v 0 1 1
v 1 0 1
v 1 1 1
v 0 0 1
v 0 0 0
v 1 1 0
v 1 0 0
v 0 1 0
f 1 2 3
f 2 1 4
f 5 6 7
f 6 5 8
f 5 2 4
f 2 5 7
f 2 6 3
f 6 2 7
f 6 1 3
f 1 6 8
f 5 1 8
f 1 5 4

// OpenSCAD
// file: ../lib/TOGMod1Constructors.scad
// TOGMod1Constructors-v1.11
// 
// Functions to construct objects understood by TOGMod1
// 
// v1.1:
// - Add togmod1_make_rounded_rect
// v1.2:
// - togmod1_make_rounded_rect can make ovals
// v1.3:
// - togmod1_circle_points, to just get the points of a circle
// - if pos parameter to circle function has a third element,
//   returned vertexes will include it as the z component;
// v1.3.1
// - Some assertions
// v1.4:
// - Refactor togmod1_rounded_rect_points and togmod1_circle_points
//   to use togmod1__make_nd_vector_adder for adapting to whatever
//   `pos` parameter is.
// v1.5:
// - togmod_rounded_rect_points will not simplify completely rounded sides
//   (where length of side is exactly twice the rounding radius)
//   unless simplify_rounded_sides=true
//   - This makes it more useful for polyhedron generation,
//     where radius varies, but number of points must remain constant.
// v1.6:
// - togmod1_make_rect makes a simple rectangle
// - togmod1_make_rounded_rect will defer to togmod1_make_rect when r=0
// v1.7:
// - togmod1_make_circle will return empty shape (["union"]) when d=0
// v1.8:
// - Add togmod1_text
// v1.9:
// - togmod1_circle_points uses 3 as minimum circle point count instead of 6
// v1.10:
// - Fix togmod1_linear_extrude_y so that range corresponds to Y start/end and
//   polygon X,Y correspond to X,Z.  Previously it was rotated wrongly,
//   which would have gone unnoticed for symmetrical shapes centered at 0,0.
// v1.11:
// - Remove an 'echo'

use <./TOGArrayLib1.scad>

function togmod1__make_nd_vector_adder(origin=[0,0]) =
	let(origin_is_zero = tal1_reduce(true, origin, function(prev,item) prev && item == 0))
	origin_is_zero ? (function(vec) len(vec) >= len(origin) ? vec : tal1_replace_at(origin, 0, vec)) :
	function(vec) [
		for(i=[0:1:max(len(origin),len(vec))-1]) (len(vec) > i ? vec[i] : 0) + (len(origin) > i ? origin[i] : 0),
	];

assert([1,2,3] == togmod1__make_nd_vector_adder()([1,2,3]));
assert([1,2,3] == togmod1__make_nd_vector_adder([0,0,3])([1,2]));


function togmod1_make_cuboid(size) =
	assert(is_list(size))
	assert(len(size) >= 3)
	assert(is_num(size[0]))
	assert(is_num(size[1]))
	assert(is_num(size[2]))
	["polyhedron-vf", [
		[-size[0]/2, -size[1]/2, -size[2]/2],
		[+size[0]/2, -size[1]/2, -size[2]/2],
		[-size[0]/2, +size[1]/2, -size[2]/2],
		[+size[0]/2, +size[1]/2, -size[2]/2],
		[-size[0]/2, -size[1]/2, +size[2]/2],
		[+size[0]/2, -size[1]/2, +size[2]/2],
		[-size[0]/2, +size[1]/2, +size[2]/2],
		[+size[0]/2, +size[1]/2, +size[2]/2]
	], [
		[0,1,3,2],[0,4,5,1],[4,6,7,5],[3,7,6,2],[1,5,7,3],[6,4,0,2]
	]];

function togmod1_make_polygon(verts) =
	["polygon-vp", verts, [[for( i=[0:1:len(verts)-1] ) i%len(verts)]]];

function togmod1_rounded_rect_points(size, r, pos=[0,0], simplify_rounded_sides=false) =
	assert(is_list(size))
	assert(len(size) >= 2)
	let(radii = is_list(r) ? r : is_num(r) ? [r,r] : assert(false, "rounded_rect r(adius) should be list<num> or num"))
	let(rx = radii[0])
	let(ry = radii[1])
	assert(is_num(rx))
	assert(is_num(ry))
	assert(size[0] >= 2*rx, str("size[0] must be >= 2*r[0]; size[0] = ",size[0],", 2*r[0] = ",2*rx))
	assert(size[1] >= 2*ry, str("size[1] must be >= 2*r[1]; size[1] = ",size[1],", 2*r[1] = ",2*ry))
	let(quarterfn=max($fn/4, 1))
	let(qfnx = simplify_rounded_sides && size[0] == 2*rx ? quarterfn-1 : quarterfn)
	let(qfny = simplify_rounded_sides && size[1] == 2*ry ? quarterfn-1 : quarterfn)
	let(finalizepos = togmod1__make_nd_vector_adder(pos))
[
	for(a=[0 : 1 : qfnx]) let(ang=      a*90/quarterfn) finalizepos([ size[0]/2-rx + rx*cos(ang),  size[1]/2-ry + ry*sin(ang)]),
	for(a=[0 : 1 : qfny]) let(ang= 90 + a*90/quarterfn) finalizepos([-size[0]/2+rx + rx*cos(ang),  size[1]/2-ry + ry*sin(ang)]),
	for(a=[0 : 1 : qfnx]) let(ang=180 + a*90/quarterfn) finalizepos([-size[0]/2+rx + rx*cos(ang), -size[1]/2+ry + ry*sin(ang)]),
	for(a=[0 : 1 : qfny]) let(ang=270 + a*90/quarterfn) finalizepos([ size[0]/2-rx + rx*cos(ang), -size[1]/2+ry + ry*sin(ang)]),
];

function togmod1_make_rect(size) =
	togmod1_make_polygon([
		[-size[0]/2, -size[1]/2],
		[+size[0]/2, -size[1]/2],
		[+size[0]/2, +size[1]/2],
		[-size[0]/2, +size[1]/2],
	]);

function togmod1_make_rounded_rect(size, r) =
	r == 0 ? togmod1_make_rect(size) :
	togmod1_make_polygon(togmod1_rounded_rect_points(size,r,simplify_rounded_sides=true));

/**
 * Returns points for an approximation of a circle where points are at distance r from pos.
 * Can be used to make other regular polygons, but the faces will be less than that
 * distance from pos (do some trig if you want face distance, e.g. for a hex nut).
 */
function togmod1_circle_points(r, pos=[0,0], d=undef) =
	assert( !is_undef(r) || !is_undef(d) )
	assert(!is_undef(pos[0]))
	assert(!is_undef(pos[1]))
	let(finalizepos = togmod1__make_nd_vector_adder(pos))
	let(r_ = !is_undef(r) ? r : d/2)
	let(fn = max($fn, 3))
	[for(i=[0 : 1 : fn-1]) finalizepos([r_*cos(i*360/fn), r_*sin(i*360/fn)])];

function togmod1_make_circle(r, pos=[0,0], d=undef) =
	r == 0 || d == 0 ? ["union"] :
	togmod1_make_polygon(togmod1_circle_points(r=r, pos=pos, d=d));

function togmod1_make_cylinder(d, zrange=[0,1], r=undef, pos=[0,0]) =
	assert( !is_undef(r) || !is_undef(d) )
	let( r_ = !is_undef(r) ? r : d/2 )
	// TODO: Make polyhedron directly
	["linear-extrude-zs", zrange, togmod1_make_circle(r=r_, pos=pos)];

function togmod1__is_range1d(range) = is_list(range) && len(range) == 2 && is_num(range[0]) && is_num(range[1]);

function togmod1_linear_extrude_z(range, shape) =
	assert(togmod1__is_range1d(range))
	["linear-extrude-zs", range, shape];
function togmod1_linear_extrude_x(range, shape) =
	assert(togmod1__is_range1d(range))
	["rotate", [90, 0, 90], togmod1_linear_extrude_z(range, shape)];
function togmod1_linear_extrude_y(range, shape) =
	assert(togmod1__is_range1d(range))
	["rotate", [90, 0,  0], togmod1_linear_extrude_z([-range[1], -range[0]], shape)];

function togmod1_text(text, size, font, halign, valign, spacing, direction, language, script) =
	["text-tsfhvsdls", text, size, font, halign, valign, spacing, direction, language, script];
// file: ../lib/TOGArrayLib1.scad
// TOGArrayLib1.5
// 
// Functions for working with arrays.
// 
// v1.1:
// - tal1_reduce assert(is_list(items)) to prevent infinite recursion
//   when given undefined or other non-list values
// v1.1.1:
// - Fix tal1_uniq_remap_v2 to return "list-remap-result" as the
//   first element of the returned list
// v1.2:
// - Add tal1_replace_at function
// v1.3:
// - tal1_is_vec_of, tal1_is_vec_of_num
// v1.4:
// - tal1_assert_for_each, for when you want to assert something
//   about each of a list of items and get nice failure messages
// v1.5:
// - Add tal1_duplicate_reversed function, which may be
//   handy when generating symmetrical polygons and stuff.

/**
 * Make a list with the contents of list `a`,
 * but starting at offset `off`, replaced by the contents of list `b`.
 * len(result) = max(len(a), off+len(b))
 */
function tal1_replace_at(a, off, b, default_value=undef, default_value_function=undef) =
	assert(is_list(a))
	assert(is_list(b))
	let( _dvf = !is_undef(default_value_function) ? default_value_function : function(i) default_value )
[
	for( i=[0:1:min(off,len(a))-1] ) a[i],
	for( i=[len(a):1:off-1] ) _dvf(i),
	for( i=[off:1:off+len(b)-1] ) b[i-off],
	for( i=[off+len(b):1:len(a)-1] ) a[i],
];

// Simplest case
assert([] == tal1_replace_at([], 0, []));
// Second simplest cases
assert(["foo"] == tal1_replace_at(["foo"], 0, []));
assert(["foo"] == tal1_replace_at([], 0, ["foo"]));
// Replace one item
assert(["foo","quux","baz"] == tal1_replace_at(["foo","bar","baz"], 1, ["quux"]));
// Replace and extend
assert(["foo","quux","tuna","tina"] == tal1_replace_at(["foo","bar","baz"], 1, ["quux", "tuna", "tina"]));
// Add beyond end of `a`
assert(["foo","zzz","quux"] == tal1_replace_at(["foo"], 2, ["quux"], default_value="zzz"));
// Adding 'nothing' should still fill to that point with defaults
assert(["foo","zzz","zzz"] == tal1_replace_at(["foo"], 3, [], default_value="zzz"));


function tal1_reduce(start, items, func, offset=0) =
	assert(is_list(items))
	len(items) == offset ? start :
	tal1_reduce(func(start, items[offset]), items, func, offset+1);

function tal1_consecutive_duplicate_count(items) = tal1_reduce(
	[0, undef],
	items,
	function(z,item) [z[0] + (item == z[1] ? 1 : 0), item]
)[0];

assert(0 == tal1_consecutive_duplicate_count([]));
assert(0 == tal1_consecutive_duplicate_count([50]));
assert(1 == tal1_consecutive_duplicate_count([50,50]));
assert(0 == tal1_consecutive_duplicate_count([50,51,52,53]));
assert(1 == tal1_consecutive_duplicate_count([50,51,52,52]));
assert(3 == tal1_consecutive_duplicate_count([50,50,50,50]));

// Set test_size to arbirarily large values
// to ensure that OpenSCAD can handle heavy recursion
let(test_size=1000) assert(test_size/2 == tal1_consecutive_duplicate_count([for(i=[0:1:test_size-1]) floor(i/2)]));



function tal1_uniq_(items, off0, off1) =
	let(chunklen = off1-off0)
	chunklen == 0 ? [] :
	chunklen == 1 ? [items[off0]] :
	let(half=floor(chunklen/2))
	let(left  = tal1_uniq_(items, off0     , off0+half))
	let(right = tal1_uniq_(items, off0+half, off1     ))
	assert(len(left) > 0)
	assert(len(right) > 0)
	left[len(left)-1] == right[0] ? [each left, for(i=[1:1:len(right)-1]) right[i]] :
	[each left, each right];

/** Given a list of items, returns a new list with identical consecutive items merged */
function tal1_uniq(items) = tal1_uniq_(items, 0, len(items));

assert([] == tal1_uniq([]));
assert([123] == tal1_uniq([123]));
assert([55,0,1,2,3] == tal1_uniq([55,0,1,2,3]));
assert([55,0,1,2] == tal1_uniq([55,0,1,1,2]));
assert([55,0,1] == tal1_uniq([55,55,0,0,0,0,0,0,1,1,1,1]));
assert([55,0] == tal1_uniq([55,0,0,0,0,0,0,0]));



/**
 * Returns [new items, old index -> new index mapping].
 * No-op version.
 */
function tal1_uniq_remap_v1(items) =
	["list-remap-result", items, [for (vi=[0:1:len(items)-1]) vi]];

// [a, a, b, b, c, c]
//
// [a,    ...], []  -> [a],[0]
// [a, a, ...], [0] -> [a],[0,0]

assert([1,2,3] == [1,2,3]);

/**
 * Recursive version that will combine adjacent identical vertexes,
 * but will use the original items.
 */
function tal1_uniq_remap_v2(items, map=[]) =
	let(index = len(map))
	len(items) == index ? ["list-remap-result", items, map] :
	index == 0 ? tal1_uniq_remap_v2(items, [0]) :
	items[index] == items[map[index-1]] ? tal1_uniq_remap_v2(items, [for(vi=map) vi, map[index-1]]) :
	tal1_uniq_remap_v2(items, [for(vi=map) vi, index]);

assert(tal1_uniq_remap_v2([1,1,2,2,3,4]) == ["list-remap-result", [1,1,2,2,3,4], [0,0,2,2,4,5]]);


/**
 * Returns true if `vec` is a list of at least min_len items
 * and component_check(each item, even those beyond min_len) is true.
 */
function tal1_is_vec_of(vec, min_len=0, component_check=function(x) true) =
	assert(is_num(min_len) && min_len >= 0)
	assert(is_function(component_check))
	is_list(vec) && len(vec) >= min_len &&
	tal1_reduce(true, vec, function(prev,item) prev && component_check(item));

function tal1_is_vec_of_num(vec, min_len=0) = tal1_is_vec_of(vec, min_len, function(i) is_num(i));

assert( true == tal1_is_vec_of_num([1,2,3]));
assert( true == tal1_is_vec_of_num([]));
assert( true == tal1_is_vec_of_num([1,2,3], 3));
assert(false == tal1_is_vec_of_num([1,2], 3));
assert(false == tal1_is_vec_of_num([1,2,"spoon"], 3));
// Requirements are ambiguous when
// first min_len items are numbers, but there are non-numeric items afterwards,
// so let's error on the side of saying 'no, it's not a list of numbers';
// i.e. the item check and the min_len are independent.
assert(false == tal1_is_vec_of_num([1,2,3,"artichoke"], 3));


/**
 * Asserts that item_checker(each item in list, index of item)[0] is true.
 * Second element of item_checker return value is assertion message.
 * Returns the original list, in case that's useful to you.
 */
function tal1_assert_for_each(list, item_checker) =
	let( _ignored = [ for(i=[0:1:len(list)-1])
		let(q=item_checker(list[i],i))
		let(passed=is_bool(q) ? q : is_list(q) ? q[0] : assert(false, str(
			"tal1_assert_for_each: item_checker should return Bool|[Bool,String], but returned ",
			q, " for item at index ", i)))
		let(message=is_list(q) ? q[1] : undef)
		assert(passed, message)
		q
	])
	list;

// Callback can return a boolean...
assert([1,2,3] == tal1_assert_for_each([1,2,3], function(v,i) is_num(v)));
// ...or a [boolean, string]
assert([1,2,3] == tal1_assert_for_each([1,2,3], function(v,i) [is_num(v), "element be a num"]));

// [a, b, c] -> [a, b, c, rxf(c), rxf(b), rxf(a)]
function tal1_duplicate_reversed(list, rxf=function(item) item) =
	[
		each list,
		for( i=[len(list)-1 : -1 : 0] ) rxf(list[i]),
	];
// main file
// TOGPolyhedronLib1Test.scad 2023
//
// tog-scad-options: openscad=x:OpenSCAD20240727Com; prefers=speed:fast

include <../lib/TOGPolyhedronLib1.scad>

cube();
